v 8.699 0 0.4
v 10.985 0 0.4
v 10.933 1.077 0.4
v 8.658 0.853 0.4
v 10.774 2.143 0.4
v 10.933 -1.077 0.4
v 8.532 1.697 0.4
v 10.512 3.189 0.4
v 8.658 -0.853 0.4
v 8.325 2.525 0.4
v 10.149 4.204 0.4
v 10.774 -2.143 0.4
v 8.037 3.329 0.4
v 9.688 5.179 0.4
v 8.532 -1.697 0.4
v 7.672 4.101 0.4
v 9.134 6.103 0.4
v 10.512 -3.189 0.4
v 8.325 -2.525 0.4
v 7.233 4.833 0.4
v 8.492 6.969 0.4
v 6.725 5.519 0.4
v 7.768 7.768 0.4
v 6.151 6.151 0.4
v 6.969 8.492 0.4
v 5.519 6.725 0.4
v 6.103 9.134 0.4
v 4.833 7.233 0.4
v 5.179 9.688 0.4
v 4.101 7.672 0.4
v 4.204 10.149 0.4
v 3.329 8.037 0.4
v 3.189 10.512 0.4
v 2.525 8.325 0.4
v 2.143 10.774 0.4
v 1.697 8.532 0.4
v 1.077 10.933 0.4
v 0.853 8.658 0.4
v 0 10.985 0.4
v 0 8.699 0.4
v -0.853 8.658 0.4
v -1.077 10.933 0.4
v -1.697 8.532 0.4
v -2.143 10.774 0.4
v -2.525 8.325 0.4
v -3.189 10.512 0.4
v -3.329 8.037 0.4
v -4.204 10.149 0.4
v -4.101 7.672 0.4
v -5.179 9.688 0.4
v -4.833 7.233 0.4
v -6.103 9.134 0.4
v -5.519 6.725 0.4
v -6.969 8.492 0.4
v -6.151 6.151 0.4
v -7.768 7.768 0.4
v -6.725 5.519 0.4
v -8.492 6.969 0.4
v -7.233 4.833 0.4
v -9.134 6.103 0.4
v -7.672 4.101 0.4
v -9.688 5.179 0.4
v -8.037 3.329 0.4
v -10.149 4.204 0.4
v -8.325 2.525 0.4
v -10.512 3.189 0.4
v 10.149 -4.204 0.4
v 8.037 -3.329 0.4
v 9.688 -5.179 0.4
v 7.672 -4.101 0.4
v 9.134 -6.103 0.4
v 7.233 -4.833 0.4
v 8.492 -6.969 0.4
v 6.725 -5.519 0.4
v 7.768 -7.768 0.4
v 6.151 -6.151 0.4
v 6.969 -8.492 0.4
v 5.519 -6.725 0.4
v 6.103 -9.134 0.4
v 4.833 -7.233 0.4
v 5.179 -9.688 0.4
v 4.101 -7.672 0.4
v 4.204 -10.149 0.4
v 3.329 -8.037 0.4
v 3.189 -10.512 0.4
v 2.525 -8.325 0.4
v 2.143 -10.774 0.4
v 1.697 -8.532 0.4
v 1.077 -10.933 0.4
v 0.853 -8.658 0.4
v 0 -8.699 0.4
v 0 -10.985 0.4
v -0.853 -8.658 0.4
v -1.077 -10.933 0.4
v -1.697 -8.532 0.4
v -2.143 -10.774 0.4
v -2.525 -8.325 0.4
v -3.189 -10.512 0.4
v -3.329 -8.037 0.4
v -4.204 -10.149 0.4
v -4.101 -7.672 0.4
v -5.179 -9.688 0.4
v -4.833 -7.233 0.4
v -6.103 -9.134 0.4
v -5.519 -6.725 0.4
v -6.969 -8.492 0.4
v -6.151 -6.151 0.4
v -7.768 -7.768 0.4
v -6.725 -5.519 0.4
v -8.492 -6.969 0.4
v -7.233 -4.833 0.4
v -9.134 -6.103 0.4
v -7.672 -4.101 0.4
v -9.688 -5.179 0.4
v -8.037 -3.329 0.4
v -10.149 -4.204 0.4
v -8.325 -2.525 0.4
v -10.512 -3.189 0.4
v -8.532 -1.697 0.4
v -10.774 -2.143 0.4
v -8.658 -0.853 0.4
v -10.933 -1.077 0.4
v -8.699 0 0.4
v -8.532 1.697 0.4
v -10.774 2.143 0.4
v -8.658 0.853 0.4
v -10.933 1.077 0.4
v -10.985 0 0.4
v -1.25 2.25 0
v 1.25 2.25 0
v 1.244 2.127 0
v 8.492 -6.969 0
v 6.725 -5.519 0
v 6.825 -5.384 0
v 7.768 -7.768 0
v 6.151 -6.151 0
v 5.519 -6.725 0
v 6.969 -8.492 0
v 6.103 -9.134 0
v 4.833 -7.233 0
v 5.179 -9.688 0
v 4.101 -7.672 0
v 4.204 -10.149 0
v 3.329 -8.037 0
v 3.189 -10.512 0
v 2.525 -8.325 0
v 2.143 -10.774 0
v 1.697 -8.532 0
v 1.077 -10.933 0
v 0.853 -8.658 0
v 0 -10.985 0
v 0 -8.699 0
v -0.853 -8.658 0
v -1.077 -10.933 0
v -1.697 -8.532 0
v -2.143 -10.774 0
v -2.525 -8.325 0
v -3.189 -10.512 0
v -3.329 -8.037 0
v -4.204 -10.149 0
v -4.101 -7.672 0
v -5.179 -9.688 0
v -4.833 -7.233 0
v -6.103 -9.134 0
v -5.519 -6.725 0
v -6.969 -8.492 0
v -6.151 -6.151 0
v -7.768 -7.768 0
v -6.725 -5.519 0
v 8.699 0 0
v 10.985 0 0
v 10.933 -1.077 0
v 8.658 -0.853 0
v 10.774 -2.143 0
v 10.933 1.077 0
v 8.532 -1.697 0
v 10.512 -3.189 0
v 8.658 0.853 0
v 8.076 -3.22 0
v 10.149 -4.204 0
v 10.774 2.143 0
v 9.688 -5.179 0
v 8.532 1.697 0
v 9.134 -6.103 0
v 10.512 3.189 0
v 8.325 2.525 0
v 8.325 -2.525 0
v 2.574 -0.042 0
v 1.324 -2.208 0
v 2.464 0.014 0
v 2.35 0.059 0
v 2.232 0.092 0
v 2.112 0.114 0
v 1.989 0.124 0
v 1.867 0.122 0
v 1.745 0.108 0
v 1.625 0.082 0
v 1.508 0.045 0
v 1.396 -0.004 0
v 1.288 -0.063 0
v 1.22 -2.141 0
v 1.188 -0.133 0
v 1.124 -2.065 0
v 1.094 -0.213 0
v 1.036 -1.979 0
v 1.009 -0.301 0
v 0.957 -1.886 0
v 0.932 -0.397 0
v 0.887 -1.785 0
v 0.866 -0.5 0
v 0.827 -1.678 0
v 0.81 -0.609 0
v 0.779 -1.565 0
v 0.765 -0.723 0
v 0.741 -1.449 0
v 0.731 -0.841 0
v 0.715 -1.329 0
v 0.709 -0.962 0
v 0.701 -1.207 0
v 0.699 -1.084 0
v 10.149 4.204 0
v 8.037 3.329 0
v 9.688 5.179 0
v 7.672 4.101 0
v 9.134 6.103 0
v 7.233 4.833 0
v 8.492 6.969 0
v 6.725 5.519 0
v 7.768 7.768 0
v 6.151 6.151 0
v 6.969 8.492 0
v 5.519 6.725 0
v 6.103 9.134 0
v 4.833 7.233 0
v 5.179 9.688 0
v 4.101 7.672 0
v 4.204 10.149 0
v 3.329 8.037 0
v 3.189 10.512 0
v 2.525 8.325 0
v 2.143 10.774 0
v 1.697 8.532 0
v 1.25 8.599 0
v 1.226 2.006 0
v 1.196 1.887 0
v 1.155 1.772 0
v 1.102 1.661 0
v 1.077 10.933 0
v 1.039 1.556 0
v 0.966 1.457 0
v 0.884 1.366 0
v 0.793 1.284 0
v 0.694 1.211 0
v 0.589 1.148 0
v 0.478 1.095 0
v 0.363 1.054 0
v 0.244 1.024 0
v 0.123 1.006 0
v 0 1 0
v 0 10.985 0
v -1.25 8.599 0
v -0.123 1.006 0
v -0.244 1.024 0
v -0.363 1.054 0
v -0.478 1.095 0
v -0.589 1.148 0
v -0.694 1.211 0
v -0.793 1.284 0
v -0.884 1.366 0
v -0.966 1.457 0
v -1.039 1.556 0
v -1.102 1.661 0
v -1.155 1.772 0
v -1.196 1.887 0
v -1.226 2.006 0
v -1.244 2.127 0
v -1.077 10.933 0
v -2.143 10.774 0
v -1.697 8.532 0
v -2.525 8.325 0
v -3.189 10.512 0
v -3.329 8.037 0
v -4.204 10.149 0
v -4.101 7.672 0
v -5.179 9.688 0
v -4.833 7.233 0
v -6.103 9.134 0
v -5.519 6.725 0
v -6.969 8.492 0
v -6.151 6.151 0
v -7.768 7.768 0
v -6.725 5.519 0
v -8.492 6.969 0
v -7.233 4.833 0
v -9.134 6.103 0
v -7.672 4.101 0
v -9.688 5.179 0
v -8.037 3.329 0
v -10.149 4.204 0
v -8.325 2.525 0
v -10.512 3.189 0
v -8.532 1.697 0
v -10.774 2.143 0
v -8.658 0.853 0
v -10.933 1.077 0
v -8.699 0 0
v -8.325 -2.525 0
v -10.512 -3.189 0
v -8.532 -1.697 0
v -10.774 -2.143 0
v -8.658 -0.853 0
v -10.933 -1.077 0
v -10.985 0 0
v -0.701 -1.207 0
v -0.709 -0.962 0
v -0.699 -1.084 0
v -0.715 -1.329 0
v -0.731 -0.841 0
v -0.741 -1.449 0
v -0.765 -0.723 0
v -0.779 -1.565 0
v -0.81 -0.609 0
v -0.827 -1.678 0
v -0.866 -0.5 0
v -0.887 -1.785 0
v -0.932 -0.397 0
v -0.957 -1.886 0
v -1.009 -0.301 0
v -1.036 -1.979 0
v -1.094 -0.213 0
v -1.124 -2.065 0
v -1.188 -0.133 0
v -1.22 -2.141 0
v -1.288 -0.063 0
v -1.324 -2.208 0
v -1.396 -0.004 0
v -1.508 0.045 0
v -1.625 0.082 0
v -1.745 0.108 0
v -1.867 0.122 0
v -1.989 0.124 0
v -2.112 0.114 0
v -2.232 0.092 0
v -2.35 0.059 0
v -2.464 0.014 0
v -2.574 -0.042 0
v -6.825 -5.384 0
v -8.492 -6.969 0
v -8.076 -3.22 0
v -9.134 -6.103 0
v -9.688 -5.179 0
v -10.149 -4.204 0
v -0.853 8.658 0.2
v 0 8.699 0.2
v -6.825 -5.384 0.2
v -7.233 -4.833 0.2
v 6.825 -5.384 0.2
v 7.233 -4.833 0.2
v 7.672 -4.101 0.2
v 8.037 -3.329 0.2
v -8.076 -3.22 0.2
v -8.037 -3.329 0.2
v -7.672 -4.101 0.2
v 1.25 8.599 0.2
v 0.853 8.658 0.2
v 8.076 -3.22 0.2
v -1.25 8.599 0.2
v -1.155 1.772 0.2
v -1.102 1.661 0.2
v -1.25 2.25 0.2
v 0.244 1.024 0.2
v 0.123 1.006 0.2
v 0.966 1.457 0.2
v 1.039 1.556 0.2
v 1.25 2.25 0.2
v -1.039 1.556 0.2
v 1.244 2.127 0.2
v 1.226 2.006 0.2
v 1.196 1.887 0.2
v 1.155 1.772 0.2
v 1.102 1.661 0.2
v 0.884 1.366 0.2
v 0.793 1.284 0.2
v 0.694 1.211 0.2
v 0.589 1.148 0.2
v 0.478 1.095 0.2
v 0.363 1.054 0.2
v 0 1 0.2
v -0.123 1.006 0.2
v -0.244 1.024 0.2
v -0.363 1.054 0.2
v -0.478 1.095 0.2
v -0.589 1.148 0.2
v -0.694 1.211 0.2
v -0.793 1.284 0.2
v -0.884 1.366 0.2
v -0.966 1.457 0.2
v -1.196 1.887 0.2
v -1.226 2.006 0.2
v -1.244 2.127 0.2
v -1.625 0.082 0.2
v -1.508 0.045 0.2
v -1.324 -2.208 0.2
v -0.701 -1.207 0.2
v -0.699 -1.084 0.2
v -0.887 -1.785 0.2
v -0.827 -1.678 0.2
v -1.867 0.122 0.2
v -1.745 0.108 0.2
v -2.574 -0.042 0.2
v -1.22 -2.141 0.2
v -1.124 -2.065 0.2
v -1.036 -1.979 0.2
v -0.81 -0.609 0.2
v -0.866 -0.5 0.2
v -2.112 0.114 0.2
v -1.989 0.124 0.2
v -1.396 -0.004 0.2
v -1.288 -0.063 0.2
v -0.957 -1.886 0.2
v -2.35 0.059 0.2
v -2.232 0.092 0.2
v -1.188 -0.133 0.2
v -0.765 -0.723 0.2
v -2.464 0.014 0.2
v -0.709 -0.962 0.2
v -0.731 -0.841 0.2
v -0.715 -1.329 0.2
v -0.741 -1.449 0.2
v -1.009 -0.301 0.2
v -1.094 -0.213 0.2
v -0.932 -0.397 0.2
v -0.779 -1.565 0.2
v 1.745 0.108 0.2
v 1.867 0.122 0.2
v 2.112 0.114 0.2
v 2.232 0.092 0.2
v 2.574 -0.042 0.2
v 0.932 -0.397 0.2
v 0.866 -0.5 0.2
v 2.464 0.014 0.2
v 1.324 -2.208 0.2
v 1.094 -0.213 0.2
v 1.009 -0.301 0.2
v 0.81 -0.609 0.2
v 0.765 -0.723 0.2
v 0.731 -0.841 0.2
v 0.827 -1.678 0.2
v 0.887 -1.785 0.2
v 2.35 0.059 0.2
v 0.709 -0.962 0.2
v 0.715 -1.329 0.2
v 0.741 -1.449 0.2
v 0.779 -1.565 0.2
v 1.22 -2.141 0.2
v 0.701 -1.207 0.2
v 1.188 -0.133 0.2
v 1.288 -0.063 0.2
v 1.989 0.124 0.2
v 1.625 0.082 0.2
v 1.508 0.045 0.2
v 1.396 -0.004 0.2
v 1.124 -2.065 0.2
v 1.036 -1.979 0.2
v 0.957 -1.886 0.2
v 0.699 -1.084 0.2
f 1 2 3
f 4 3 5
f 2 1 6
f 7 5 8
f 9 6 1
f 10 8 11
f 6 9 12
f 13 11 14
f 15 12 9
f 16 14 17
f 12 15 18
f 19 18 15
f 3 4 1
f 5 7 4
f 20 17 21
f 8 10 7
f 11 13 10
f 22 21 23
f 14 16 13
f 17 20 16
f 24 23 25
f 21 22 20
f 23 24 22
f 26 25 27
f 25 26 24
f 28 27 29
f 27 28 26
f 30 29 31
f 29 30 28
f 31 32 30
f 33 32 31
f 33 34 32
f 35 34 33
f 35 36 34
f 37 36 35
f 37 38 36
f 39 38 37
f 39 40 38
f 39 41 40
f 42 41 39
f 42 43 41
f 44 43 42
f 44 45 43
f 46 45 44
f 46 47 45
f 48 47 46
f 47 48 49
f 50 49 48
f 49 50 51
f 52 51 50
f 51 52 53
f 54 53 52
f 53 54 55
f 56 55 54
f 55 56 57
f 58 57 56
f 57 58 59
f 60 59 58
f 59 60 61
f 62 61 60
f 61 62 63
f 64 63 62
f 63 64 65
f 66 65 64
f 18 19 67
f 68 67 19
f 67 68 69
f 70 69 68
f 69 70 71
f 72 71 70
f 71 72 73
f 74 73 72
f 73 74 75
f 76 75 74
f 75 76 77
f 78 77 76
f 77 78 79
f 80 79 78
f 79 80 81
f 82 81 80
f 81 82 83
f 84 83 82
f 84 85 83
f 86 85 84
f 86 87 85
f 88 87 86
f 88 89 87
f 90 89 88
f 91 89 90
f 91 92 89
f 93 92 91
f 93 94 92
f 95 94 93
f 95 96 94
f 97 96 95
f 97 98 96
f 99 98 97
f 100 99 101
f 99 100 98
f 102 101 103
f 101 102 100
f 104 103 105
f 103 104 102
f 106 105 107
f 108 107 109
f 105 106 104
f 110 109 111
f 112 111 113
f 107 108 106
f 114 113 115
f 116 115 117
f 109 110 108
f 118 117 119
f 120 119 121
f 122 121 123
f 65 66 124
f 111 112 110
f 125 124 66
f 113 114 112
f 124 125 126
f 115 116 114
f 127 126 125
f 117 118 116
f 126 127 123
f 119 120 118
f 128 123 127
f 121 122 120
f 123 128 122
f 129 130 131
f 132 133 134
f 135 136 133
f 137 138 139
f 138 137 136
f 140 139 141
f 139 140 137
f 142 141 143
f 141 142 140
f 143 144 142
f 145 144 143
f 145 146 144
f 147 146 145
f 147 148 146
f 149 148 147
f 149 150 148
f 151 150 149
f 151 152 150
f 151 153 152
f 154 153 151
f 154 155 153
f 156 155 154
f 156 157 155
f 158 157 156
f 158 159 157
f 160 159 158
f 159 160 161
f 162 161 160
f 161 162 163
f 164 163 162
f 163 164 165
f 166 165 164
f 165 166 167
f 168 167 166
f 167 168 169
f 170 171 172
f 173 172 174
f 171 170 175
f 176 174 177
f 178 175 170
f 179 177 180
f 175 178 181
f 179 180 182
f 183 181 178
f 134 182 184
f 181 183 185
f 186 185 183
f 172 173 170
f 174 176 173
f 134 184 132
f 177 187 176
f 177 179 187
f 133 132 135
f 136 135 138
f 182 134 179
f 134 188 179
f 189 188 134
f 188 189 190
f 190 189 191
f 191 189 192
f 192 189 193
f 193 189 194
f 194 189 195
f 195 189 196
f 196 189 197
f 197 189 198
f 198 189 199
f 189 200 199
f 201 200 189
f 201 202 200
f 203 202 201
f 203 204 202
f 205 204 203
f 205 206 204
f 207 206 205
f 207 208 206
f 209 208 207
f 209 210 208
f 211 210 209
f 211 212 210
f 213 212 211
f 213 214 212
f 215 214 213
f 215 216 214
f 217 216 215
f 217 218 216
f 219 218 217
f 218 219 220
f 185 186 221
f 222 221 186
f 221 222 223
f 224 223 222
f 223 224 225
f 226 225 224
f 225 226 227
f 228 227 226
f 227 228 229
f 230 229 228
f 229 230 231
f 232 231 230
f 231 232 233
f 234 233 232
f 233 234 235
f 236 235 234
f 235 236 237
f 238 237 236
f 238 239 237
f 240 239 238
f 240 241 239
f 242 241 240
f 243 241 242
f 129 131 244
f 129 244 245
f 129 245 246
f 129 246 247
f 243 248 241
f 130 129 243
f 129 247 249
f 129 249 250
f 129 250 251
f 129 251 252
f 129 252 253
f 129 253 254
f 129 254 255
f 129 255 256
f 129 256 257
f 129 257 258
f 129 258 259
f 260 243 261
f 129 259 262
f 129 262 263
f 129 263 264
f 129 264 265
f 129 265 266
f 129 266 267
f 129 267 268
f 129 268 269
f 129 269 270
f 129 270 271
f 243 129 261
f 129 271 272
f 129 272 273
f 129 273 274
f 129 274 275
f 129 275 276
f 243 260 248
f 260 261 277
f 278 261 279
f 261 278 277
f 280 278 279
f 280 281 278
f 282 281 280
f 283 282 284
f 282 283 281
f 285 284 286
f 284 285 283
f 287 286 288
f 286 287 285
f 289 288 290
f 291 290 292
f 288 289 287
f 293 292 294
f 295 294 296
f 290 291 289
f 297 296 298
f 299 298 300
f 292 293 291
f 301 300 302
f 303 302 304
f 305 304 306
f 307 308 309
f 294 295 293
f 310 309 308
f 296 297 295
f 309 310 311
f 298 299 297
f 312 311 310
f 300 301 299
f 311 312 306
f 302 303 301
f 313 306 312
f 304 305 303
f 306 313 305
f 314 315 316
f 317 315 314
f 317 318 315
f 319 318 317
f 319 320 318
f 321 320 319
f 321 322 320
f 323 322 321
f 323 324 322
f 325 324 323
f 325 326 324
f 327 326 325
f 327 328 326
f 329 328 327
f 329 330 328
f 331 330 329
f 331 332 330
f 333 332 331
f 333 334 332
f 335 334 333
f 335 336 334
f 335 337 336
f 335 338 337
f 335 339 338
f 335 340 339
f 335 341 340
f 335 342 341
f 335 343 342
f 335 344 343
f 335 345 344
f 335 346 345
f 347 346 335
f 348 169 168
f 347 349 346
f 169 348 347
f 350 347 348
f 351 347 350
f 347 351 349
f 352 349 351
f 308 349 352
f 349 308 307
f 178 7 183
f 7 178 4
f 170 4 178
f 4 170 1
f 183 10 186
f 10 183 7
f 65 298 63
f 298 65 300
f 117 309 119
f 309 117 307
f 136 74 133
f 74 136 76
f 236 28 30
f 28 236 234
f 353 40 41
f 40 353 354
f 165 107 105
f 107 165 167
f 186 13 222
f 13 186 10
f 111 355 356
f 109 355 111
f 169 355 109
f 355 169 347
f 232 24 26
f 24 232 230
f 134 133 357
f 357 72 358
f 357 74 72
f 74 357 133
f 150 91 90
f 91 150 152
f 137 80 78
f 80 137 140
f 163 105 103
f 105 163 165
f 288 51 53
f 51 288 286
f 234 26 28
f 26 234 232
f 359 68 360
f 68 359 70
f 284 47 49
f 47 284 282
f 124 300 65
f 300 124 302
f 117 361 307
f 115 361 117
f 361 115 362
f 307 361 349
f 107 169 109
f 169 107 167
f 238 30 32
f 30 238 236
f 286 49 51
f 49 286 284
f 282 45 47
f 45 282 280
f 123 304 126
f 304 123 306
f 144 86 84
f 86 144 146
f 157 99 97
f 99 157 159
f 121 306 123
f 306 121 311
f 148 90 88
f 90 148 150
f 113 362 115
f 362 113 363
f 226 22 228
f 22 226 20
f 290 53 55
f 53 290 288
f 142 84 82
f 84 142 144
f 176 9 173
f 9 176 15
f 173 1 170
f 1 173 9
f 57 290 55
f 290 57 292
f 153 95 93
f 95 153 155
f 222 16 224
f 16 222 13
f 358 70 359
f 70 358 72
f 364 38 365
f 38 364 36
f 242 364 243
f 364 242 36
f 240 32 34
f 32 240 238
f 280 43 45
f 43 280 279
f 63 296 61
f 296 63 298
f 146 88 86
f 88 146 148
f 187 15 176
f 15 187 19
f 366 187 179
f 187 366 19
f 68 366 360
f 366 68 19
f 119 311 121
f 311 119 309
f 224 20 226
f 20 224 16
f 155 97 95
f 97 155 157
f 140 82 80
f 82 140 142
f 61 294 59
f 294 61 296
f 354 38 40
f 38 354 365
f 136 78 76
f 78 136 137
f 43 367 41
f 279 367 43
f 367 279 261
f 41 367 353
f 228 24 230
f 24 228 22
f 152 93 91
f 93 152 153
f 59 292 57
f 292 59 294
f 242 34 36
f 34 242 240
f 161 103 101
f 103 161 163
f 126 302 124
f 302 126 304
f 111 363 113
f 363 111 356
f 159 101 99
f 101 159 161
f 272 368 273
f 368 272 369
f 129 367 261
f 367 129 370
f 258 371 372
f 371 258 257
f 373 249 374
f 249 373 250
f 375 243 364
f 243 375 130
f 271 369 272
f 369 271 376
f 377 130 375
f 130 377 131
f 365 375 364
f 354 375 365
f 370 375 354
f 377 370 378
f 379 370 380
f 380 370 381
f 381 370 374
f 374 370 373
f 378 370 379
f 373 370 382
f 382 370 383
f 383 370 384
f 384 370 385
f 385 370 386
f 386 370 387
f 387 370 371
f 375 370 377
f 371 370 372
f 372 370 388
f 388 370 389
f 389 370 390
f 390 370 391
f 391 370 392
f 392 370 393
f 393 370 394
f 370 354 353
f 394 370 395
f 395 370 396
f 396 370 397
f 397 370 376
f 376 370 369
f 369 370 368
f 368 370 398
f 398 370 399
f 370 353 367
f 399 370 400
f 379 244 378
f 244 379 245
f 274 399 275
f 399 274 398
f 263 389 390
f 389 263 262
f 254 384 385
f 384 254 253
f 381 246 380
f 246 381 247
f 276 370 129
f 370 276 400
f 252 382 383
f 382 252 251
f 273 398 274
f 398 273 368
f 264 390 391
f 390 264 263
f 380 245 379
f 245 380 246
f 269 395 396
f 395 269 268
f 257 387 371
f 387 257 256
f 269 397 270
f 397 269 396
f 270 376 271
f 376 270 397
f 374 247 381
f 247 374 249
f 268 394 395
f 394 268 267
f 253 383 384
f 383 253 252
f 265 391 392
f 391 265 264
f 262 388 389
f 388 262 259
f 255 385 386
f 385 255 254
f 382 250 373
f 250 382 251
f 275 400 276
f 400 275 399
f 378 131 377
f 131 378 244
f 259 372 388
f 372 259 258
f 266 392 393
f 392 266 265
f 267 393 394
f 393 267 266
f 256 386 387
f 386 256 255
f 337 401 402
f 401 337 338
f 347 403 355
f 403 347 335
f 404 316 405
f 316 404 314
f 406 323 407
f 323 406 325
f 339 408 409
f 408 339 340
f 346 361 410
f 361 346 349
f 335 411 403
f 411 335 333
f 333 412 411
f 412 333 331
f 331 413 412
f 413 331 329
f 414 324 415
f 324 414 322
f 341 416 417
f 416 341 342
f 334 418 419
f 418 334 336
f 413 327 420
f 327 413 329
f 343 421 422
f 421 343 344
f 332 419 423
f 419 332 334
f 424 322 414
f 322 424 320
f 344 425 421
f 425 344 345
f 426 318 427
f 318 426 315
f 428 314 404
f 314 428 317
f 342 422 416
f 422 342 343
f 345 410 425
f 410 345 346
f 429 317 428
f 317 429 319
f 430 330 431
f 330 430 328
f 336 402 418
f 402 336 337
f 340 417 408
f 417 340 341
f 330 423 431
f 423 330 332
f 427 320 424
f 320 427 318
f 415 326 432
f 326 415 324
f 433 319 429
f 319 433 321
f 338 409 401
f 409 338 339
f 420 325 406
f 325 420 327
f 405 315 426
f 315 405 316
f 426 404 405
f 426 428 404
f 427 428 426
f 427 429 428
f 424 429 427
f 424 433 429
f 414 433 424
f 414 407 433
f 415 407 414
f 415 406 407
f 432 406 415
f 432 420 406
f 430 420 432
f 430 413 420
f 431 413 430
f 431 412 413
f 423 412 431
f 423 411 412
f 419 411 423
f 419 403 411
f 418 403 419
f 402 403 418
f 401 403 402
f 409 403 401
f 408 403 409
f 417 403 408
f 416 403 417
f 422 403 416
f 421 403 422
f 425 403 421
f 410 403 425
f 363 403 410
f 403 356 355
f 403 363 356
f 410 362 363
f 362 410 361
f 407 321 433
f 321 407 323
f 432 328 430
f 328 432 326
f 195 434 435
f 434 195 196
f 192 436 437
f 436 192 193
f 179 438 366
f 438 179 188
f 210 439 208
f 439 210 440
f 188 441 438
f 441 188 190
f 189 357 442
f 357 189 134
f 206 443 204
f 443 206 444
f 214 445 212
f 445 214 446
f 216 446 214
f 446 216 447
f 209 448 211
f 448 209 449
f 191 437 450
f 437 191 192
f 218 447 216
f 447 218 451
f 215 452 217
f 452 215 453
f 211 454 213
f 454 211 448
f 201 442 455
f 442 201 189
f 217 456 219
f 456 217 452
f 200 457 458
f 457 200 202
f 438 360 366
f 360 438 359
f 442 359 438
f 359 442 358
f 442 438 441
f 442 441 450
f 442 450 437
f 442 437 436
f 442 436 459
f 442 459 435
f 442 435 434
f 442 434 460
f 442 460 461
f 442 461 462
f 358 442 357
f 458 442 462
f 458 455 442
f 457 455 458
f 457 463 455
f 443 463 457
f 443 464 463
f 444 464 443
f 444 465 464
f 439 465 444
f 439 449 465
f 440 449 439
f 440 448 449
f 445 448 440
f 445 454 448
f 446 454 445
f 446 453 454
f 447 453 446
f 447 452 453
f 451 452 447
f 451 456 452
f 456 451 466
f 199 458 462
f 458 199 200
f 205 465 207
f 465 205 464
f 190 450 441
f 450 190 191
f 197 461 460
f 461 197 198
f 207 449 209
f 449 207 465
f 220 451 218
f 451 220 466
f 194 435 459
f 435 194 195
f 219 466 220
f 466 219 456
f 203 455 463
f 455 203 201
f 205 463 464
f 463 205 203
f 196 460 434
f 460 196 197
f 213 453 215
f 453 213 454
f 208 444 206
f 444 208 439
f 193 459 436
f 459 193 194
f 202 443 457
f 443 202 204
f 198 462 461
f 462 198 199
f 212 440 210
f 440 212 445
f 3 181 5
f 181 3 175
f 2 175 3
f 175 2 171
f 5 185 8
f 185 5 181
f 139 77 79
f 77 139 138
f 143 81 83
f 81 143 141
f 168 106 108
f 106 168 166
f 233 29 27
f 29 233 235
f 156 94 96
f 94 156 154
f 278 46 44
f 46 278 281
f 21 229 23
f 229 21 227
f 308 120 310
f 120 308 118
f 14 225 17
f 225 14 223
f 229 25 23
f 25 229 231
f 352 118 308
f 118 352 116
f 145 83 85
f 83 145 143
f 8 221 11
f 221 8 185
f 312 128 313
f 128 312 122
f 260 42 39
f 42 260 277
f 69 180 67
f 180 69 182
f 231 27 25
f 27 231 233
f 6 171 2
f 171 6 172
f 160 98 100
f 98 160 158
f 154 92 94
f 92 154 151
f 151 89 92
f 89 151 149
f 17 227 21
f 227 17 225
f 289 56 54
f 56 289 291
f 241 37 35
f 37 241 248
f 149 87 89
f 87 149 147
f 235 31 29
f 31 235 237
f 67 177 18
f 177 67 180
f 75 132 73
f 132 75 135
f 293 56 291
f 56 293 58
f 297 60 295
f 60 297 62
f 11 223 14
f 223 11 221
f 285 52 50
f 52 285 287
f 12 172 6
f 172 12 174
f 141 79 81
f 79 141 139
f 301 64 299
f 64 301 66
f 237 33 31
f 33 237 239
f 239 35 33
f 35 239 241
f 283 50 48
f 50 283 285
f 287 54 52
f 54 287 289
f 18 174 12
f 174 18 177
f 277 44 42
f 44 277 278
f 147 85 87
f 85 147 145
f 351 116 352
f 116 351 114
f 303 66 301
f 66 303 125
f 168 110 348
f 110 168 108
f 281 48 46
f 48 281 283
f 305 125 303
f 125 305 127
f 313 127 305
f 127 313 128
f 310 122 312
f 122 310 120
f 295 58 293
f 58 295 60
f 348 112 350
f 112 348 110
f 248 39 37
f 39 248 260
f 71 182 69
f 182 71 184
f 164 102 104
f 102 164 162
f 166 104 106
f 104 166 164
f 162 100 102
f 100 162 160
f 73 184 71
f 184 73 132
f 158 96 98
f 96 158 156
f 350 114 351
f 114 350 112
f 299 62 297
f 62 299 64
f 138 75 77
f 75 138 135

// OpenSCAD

//  Outer diameter
OD_inch = 0.865;
//  Inner diameter
ID_inch = 0.685;
Lip_Thickness = 0.4;
//  Number of prongs
N = 3;
//  Distance from prong edge to center
D = 1;
//  Prong diameter
PD = 2.5;
Prong_Thickness=0.2;
//  Facets for circles
$fn=64;

anti_rollout();

module anti_rollout() {
	intersection() {
		cylinder(h=Lip_Thickness*3, r=25.4*OD_inch/2, center=true);
		union() {
			difference() {
				cylinder(h=Lip_Thickness, r=1.01*25.4*OD_inch/2);
				cylinder(h=Lip_Thickness*3, r=25.4*ID_inch/2, center=true);
			}
			for (a=[0:N-1]) rotate([0,0,360*a/N]) hull() {
					translate([0,D+PD/2,0]) cylinder(h=Prong_Thickness,r=PD/2);
					translate([0,25.4*ID_inch/2,0]) cylinder(h=Prong_Thickness,r=PD/2);
			}
		}
	}
}
